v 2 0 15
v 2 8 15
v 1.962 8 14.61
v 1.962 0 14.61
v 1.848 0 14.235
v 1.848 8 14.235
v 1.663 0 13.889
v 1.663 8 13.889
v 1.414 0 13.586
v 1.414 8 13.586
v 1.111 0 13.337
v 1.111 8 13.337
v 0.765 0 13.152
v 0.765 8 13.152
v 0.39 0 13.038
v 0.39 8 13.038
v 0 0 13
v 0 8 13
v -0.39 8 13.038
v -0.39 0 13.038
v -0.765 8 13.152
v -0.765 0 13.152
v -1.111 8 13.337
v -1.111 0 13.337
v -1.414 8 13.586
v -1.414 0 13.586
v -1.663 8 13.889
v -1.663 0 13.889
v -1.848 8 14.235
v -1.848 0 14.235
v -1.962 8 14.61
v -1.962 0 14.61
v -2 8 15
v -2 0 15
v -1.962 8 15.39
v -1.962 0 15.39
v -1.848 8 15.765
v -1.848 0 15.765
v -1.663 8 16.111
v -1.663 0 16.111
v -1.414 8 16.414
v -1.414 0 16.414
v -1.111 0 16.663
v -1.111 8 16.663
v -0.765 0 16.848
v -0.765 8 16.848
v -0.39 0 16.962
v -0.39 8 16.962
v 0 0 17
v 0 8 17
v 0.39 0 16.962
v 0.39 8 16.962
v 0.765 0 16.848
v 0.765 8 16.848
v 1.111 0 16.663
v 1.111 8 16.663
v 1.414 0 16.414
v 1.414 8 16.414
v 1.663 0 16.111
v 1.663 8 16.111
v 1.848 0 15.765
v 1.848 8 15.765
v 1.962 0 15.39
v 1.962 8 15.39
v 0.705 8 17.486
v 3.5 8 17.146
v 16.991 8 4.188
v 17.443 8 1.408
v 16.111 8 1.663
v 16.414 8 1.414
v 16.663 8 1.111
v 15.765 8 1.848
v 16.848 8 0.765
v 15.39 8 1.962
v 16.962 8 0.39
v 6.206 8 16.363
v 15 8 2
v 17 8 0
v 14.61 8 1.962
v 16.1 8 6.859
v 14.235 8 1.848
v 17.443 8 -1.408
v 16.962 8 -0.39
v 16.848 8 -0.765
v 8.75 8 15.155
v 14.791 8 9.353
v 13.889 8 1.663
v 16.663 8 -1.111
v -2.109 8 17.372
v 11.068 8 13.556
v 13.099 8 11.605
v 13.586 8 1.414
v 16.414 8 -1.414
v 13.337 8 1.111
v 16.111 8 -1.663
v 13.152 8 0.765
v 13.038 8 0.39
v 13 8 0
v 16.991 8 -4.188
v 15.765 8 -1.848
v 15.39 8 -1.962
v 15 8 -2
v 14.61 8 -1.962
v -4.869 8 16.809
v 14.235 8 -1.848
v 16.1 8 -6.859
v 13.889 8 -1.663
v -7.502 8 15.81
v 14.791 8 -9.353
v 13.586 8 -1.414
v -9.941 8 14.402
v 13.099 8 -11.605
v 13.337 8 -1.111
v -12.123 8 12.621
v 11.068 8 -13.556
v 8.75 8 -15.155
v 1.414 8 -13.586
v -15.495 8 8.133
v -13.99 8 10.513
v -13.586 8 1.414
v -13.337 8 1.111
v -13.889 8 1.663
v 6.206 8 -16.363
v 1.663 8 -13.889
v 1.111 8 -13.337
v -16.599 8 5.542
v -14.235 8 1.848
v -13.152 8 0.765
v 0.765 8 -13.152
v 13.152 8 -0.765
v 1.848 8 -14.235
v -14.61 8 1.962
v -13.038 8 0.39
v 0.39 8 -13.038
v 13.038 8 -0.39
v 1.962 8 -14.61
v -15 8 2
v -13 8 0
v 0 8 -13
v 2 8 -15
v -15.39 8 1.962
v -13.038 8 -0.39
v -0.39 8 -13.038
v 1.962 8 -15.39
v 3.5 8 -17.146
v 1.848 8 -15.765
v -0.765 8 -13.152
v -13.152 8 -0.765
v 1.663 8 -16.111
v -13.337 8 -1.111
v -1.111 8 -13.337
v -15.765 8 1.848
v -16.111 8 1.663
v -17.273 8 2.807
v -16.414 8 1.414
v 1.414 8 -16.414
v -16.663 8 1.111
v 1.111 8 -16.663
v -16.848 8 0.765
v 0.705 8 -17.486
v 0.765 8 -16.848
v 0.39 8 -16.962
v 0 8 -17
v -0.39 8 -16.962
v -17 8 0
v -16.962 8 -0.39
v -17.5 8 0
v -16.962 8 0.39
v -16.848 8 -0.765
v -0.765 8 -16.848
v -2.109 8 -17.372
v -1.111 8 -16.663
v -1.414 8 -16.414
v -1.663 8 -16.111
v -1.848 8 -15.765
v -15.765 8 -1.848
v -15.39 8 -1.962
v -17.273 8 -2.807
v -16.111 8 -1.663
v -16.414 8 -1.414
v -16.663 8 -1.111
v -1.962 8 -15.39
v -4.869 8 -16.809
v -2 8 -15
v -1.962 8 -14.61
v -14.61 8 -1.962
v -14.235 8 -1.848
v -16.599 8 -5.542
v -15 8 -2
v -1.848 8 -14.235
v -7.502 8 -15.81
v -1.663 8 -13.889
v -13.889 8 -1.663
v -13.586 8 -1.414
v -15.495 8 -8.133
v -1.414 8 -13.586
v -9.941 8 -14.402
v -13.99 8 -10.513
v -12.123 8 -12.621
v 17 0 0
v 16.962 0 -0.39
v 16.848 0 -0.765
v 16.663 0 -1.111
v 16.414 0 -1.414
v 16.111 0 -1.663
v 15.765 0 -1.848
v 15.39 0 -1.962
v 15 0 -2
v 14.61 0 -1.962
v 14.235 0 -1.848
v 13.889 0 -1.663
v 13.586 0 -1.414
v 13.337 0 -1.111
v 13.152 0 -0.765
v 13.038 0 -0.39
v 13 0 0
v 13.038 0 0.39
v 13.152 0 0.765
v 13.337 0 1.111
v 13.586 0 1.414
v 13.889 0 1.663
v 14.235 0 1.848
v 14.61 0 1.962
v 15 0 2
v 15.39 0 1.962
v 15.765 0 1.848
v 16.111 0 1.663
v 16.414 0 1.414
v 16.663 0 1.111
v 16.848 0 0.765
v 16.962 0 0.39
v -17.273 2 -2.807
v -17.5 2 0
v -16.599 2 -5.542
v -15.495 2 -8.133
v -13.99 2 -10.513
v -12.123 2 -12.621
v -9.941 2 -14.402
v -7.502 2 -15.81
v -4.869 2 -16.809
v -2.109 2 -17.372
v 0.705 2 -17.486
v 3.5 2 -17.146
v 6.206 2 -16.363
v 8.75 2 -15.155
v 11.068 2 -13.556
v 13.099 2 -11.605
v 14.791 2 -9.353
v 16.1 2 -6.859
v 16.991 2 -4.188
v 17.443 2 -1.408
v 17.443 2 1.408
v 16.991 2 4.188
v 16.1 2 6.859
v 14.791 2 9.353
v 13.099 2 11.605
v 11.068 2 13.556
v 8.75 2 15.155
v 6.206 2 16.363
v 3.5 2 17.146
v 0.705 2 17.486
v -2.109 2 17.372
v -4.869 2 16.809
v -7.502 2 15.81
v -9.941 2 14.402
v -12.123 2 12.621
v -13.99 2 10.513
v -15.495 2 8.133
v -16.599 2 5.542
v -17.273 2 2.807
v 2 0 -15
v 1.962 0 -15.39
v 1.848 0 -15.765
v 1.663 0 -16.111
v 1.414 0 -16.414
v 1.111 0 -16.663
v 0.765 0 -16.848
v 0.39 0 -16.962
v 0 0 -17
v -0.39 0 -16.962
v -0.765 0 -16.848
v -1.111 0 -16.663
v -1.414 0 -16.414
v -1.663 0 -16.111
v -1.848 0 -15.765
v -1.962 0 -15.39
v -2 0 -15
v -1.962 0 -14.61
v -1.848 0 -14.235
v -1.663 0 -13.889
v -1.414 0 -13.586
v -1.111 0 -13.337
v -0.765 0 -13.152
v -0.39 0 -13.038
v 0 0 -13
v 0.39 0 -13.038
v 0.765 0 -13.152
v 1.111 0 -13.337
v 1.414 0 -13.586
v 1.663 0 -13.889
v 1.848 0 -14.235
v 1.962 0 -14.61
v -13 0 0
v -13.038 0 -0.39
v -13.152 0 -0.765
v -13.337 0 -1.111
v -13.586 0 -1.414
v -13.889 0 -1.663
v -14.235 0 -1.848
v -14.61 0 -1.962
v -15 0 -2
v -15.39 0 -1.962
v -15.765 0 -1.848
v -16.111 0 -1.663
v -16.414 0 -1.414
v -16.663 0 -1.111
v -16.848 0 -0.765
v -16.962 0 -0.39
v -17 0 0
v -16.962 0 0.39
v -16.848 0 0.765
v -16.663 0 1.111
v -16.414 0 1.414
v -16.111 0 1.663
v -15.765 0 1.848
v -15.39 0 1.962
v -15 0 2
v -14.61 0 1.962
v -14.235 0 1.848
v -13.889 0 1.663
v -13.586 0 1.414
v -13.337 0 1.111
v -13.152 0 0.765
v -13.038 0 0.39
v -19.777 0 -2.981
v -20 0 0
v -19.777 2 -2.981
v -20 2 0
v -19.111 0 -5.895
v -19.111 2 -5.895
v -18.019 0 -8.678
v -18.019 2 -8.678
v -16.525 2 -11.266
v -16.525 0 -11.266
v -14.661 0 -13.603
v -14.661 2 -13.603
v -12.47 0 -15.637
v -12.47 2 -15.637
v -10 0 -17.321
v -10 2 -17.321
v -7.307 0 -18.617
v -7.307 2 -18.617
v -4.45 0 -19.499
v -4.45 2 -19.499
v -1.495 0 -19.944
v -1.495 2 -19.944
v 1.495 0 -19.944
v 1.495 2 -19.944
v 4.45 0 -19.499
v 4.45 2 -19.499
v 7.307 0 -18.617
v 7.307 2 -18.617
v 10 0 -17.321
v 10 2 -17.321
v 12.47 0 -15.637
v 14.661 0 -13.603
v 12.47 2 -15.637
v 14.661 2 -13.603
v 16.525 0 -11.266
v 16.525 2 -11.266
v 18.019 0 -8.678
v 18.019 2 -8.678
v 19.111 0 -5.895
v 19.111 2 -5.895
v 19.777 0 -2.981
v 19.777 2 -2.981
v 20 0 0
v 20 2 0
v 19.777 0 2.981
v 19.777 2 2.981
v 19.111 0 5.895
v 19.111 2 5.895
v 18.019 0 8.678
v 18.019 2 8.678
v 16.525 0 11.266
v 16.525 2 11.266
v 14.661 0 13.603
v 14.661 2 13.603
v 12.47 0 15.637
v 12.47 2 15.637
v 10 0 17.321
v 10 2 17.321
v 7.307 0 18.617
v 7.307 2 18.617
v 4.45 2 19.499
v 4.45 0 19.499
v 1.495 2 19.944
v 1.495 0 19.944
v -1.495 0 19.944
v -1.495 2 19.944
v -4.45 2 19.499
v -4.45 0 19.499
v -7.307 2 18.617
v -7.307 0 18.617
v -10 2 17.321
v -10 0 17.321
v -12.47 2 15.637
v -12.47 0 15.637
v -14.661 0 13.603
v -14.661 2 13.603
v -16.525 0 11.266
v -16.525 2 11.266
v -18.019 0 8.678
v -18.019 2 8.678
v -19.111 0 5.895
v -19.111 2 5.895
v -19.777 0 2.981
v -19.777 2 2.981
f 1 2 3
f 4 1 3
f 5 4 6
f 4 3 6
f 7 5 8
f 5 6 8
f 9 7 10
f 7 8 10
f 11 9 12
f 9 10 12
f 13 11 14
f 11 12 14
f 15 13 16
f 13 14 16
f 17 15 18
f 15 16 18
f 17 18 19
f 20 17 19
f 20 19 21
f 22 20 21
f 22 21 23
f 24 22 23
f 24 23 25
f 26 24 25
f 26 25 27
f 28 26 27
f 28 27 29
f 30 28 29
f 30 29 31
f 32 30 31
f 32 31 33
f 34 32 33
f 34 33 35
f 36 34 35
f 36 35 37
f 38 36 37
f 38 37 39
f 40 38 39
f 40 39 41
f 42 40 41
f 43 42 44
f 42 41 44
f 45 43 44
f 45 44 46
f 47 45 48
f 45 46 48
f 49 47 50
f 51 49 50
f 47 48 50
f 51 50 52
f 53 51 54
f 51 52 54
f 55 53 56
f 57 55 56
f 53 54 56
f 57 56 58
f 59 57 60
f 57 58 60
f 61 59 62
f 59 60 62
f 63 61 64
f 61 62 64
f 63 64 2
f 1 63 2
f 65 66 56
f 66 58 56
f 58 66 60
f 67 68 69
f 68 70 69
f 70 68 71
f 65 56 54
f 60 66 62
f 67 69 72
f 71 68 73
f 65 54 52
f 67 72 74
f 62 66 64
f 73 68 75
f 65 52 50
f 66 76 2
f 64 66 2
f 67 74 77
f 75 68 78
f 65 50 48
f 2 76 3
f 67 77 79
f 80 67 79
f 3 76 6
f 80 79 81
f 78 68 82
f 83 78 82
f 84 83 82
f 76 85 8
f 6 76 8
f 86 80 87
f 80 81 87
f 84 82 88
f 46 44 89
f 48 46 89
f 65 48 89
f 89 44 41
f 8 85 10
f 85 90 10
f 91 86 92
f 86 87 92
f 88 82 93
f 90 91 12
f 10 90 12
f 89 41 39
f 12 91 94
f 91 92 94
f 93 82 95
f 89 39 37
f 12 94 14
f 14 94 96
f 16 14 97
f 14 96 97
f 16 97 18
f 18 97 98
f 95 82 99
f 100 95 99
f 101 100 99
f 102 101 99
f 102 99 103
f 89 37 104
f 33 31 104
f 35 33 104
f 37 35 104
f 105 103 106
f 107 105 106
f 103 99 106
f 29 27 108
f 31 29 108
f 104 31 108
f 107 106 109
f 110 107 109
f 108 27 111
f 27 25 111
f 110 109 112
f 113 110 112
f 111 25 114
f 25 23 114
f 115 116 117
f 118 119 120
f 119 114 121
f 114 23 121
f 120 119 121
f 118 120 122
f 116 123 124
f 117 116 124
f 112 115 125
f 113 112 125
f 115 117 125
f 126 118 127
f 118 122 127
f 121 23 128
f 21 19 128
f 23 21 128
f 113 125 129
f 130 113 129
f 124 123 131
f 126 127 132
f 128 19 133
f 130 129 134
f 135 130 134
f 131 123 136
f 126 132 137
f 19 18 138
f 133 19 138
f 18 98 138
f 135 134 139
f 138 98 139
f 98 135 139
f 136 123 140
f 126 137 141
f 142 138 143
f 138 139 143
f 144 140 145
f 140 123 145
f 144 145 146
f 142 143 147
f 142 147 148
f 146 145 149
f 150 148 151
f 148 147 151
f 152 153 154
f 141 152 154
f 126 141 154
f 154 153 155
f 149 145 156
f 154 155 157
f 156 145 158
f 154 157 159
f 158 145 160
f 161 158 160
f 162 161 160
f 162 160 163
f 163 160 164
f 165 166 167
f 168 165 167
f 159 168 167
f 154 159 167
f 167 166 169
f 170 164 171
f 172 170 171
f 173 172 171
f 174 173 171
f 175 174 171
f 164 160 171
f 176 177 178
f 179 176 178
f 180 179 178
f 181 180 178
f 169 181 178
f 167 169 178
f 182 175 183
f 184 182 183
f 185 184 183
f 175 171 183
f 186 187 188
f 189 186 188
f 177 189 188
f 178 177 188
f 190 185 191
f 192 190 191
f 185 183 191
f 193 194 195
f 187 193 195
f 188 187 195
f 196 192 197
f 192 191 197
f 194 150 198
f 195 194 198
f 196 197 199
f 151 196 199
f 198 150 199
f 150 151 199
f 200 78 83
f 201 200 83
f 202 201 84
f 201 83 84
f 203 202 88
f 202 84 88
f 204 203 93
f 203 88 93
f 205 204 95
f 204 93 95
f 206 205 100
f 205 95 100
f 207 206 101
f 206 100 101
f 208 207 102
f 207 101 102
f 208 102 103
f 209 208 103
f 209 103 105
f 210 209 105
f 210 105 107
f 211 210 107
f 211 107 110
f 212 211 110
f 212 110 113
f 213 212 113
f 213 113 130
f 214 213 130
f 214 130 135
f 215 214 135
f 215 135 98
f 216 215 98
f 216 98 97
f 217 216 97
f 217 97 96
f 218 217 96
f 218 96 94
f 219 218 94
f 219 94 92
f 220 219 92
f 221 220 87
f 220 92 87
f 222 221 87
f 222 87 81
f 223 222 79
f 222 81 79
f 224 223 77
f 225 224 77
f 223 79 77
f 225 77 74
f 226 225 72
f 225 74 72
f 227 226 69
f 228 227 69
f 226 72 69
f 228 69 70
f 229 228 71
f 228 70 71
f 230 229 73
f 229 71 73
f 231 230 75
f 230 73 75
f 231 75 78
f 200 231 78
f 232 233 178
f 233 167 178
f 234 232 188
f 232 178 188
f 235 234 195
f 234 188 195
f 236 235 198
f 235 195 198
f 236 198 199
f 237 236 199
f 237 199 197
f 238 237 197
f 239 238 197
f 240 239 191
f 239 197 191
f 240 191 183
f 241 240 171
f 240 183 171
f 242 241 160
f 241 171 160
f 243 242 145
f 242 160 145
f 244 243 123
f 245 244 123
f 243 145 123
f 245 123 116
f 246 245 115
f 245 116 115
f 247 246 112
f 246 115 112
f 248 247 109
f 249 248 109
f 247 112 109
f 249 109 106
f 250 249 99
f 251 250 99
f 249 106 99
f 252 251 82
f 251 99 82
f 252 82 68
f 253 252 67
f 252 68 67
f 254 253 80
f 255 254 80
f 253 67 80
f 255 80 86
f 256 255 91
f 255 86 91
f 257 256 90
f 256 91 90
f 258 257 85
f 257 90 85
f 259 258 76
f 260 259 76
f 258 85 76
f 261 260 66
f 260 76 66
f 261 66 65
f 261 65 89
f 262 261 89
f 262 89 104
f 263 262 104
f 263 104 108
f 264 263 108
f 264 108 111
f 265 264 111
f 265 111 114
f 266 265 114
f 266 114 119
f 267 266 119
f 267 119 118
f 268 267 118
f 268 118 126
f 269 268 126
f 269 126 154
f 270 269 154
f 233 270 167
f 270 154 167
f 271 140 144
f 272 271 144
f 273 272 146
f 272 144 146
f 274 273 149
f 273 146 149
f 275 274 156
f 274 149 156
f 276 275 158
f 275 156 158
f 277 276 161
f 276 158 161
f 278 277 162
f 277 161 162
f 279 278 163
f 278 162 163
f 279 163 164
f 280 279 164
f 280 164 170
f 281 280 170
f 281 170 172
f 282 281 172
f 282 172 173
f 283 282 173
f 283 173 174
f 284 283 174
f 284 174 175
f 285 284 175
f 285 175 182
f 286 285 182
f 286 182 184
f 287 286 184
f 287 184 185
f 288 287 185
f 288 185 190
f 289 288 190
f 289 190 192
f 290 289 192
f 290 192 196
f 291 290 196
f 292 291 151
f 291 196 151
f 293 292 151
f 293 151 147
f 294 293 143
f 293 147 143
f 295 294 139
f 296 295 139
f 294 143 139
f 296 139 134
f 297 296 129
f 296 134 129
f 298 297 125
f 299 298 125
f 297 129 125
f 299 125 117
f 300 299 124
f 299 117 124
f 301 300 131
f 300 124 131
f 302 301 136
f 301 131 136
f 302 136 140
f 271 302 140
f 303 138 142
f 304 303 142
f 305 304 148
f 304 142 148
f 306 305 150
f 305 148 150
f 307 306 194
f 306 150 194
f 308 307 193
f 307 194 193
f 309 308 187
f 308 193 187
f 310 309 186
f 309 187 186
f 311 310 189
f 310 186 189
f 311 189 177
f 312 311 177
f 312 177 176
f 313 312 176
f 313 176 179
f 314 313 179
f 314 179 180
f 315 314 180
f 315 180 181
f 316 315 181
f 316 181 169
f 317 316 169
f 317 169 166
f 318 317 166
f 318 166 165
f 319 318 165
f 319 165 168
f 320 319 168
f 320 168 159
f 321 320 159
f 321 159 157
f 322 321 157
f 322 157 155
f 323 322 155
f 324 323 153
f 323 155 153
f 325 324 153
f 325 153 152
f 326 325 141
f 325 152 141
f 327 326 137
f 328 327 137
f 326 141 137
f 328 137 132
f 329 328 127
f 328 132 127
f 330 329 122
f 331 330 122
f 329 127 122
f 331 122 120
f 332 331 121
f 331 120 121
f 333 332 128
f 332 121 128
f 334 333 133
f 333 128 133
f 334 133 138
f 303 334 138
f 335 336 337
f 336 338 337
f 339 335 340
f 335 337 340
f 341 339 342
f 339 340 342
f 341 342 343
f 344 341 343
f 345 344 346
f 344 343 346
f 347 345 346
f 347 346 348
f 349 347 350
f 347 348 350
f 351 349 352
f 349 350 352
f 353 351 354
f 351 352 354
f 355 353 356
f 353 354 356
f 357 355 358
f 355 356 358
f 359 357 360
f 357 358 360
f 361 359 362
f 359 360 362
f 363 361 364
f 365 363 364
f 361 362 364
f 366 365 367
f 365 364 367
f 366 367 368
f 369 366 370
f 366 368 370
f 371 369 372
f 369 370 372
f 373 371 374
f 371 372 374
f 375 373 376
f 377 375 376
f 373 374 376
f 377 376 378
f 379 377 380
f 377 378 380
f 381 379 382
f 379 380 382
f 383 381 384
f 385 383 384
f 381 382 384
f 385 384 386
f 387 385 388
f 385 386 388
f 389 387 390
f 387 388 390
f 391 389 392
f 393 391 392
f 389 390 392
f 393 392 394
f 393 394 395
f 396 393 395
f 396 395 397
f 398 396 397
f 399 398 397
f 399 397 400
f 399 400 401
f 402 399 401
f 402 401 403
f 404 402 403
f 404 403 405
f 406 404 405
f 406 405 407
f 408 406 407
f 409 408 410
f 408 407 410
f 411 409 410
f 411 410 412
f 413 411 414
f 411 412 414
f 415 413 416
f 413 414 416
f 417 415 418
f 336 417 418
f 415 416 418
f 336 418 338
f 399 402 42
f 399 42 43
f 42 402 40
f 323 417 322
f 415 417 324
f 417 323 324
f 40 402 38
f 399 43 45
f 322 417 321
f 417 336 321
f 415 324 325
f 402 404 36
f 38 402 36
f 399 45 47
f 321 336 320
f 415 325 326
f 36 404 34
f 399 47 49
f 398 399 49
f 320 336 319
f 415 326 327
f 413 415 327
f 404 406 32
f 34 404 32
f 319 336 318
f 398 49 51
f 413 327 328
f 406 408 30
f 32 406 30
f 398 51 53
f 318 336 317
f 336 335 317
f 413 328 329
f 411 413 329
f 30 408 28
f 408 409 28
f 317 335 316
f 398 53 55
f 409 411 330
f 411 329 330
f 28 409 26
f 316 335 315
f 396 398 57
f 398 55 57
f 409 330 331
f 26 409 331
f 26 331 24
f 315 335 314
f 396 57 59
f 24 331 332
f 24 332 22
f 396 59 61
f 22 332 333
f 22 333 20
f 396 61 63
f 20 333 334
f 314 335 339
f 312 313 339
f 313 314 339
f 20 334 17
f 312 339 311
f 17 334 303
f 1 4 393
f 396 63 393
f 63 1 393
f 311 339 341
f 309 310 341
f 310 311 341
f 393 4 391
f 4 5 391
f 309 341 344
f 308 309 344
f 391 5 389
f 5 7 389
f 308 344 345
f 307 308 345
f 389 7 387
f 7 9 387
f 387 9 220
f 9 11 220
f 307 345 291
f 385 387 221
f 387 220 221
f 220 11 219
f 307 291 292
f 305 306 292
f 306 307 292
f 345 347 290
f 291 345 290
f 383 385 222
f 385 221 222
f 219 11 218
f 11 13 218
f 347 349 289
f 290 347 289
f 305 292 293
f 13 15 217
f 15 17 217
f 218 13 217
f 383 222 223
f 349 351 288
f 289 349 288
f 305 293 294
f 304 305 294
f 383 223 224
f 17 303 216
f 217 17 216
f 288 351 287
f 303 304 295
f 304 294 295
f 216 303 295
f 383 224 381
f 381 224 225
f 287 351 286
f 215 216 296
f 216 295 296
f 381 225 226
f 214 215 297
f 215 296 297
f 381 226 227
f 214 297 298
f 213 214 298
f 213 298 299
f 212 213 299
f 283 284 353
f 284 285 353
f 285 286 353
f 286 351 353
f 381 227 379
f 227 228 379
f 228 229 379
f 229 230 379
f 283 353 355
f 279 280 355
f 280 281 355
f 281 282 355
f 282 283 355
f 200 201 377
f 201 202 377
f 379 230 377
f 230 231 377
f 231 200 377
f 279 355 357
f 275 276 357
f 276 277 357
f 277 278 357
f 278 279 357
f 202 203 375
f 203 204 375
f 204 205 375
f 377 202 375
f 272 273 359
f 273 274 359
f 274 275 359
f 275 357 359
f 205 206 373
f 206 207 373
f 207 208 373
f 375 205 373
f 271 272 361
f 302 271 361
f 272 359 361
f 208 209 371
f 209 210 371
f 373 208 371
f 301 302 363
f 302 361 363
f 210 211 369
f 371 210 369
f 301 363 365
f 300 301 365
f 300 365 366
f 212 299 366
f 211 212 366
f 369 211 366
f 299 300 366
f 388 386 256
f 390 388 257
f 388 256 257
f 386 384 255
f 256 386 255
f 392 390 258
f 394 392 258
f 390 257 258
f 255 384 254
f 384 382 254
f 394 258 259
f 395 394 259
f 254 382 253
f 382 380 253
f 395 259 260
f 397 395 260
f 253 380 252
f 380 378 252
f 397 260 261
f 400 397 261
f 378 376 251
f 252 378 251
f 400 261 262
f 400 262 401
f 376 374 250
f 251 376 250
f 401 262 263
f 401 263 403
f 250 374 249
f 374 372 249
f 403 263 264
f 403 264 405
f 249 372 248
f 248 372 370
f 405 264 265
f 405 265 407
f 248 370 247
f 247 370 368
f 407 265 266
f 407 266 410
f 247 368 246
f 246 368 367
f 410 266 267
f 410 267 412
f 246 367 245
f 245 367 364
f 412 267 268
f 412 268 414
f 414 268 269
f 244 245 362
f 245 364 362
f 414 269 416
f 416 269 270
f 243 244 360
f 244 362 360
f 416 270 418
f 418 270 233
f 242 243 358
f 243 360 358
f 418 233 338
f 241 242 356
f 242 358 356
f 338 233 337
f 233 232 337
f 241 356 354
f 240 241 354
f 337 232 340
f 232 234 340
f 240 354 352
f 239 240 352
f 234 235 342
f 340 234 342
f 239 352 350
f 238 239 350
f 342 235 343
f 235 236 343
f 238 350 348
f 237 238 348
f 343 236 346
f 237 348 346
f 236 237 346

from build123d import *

# Parameters (mm, degrees)
CUT_EXTRUDE_1_REACH             = 31.394
SKETCH_3_R                      = 2
CUT_EXTRUDE_1_DIRECTION_2_DEPTH = 30.393876913


with BuildPart() as part:
    # 草图2 → 旋转1 (revolve)
    with BuildSketch(Plane.XY):
        Polygon((0, 0), (-20, 0), (-20, 2), (-17.5, 2), (-17.5, 8), (0, 8), align=None)
    revolve(axis=Axis((0, 8, 0), (0, -1, 0)))

    # 草图3 → 切除-拉伸1 (cut, up to next)
    with BuildSketch(Plane(origin=(0, 8, 0), x_dir=(1, 0, 0), z_dir=(0, 1, 0)), mode=Mode.PRIVATE) as cut_extrude_1_sk1:
        with Locations((0, 15)):
            Circle(SKETCH_3_R)
    cut_extrude_1_tool1 = extrude(cut_extrude_1_sk1.sketch, amount=-CUT_EXTRUDE_1_REACH, mode=Mode.PRIVATE) & part.part
    # 草图3 → 切除-拉伸1 (cut, up to next)
    with BuildSketch(Plane(origin=(0, 8, 0), x_dir=(1, 0, 0), z_dir=(0, 1, 0)), mode=Mode.PRIVATE) as cut_extrude_1_sk2:
        with Locations((15, 0)):
            Circle(SKETCH_3_R)
    cut_extrude_1_tool2 = extrude(cut_extrude_1_sk2.sketch, amount=-CUT_EXTRUDE_1_REACH, mode=Mode.PRIVATE) & part.part
    # 草图3 → 切除-拉伸1 (cut, up to next)
    with BuildSketch(Plane(origin=(0, 8, 0), x_dir=(1, 0, 0), z_dir=(0, 1, 0)), mode=Mode.PRIVATE) as cut_extrude_1_sk3:
        with Locations((0, -15)):
            Circle(SKETCH_3_R)
    cut_extrude_1_tool3 = extrude(cut_extrude_1_sk3.sketch, amount=-CUT_EXTRUDE_1_REACH, mode=Mode.PRIVATE) & part.part
    # 草图3 → 切除-拉伸1 (cut, up to next)
    with BuildSketch(Plane(origin=(0, 8, 0), x_dir=(1, 0, 0), z_dir=(0, 1, 0)), mode=Mode.PRIVATE) as cut_extrude_1_sk4:
        with Locations((-15, 0)):
            Circle(SKETCH_3_R)
    cut_extrude_1_tool4 = extrude(cut_extrude_1_sk4.sketch, amount=-CUT_EXTRUDE_1_REACH, mode=Mode.PRIVATE) & part.part
    add(cut_extrude_1_tool1.solids().sort_by_distance((0, 8, -15))[0], mode=Mode.SUBTRACT)
    add(cut_extrude_1_tool2.solids().sort_by_distance((15, 8, 0))[0], mode=Mode.SUBTRACT)
    add(cut_extrude_1_tool3.solids().sort_by_distance((0, 8, 15))[0], mode=Mode.SUBTRACT)
    add(cut_extrude_1_tool4.solids().sort_by_distance((-15, 8, 0))[0], mode=Mode.SUBTRACT)

    # 草图3 → 切除-拉伸1 direction 2 (cut)
    with BuildSketch(Plane(origin=(0, 8, 0), x_dir=(1, 0, 0), z_dir=(0, 1, 0))):
        with Locations((0, 15)):
            Circle(SKETCH_3_R)
        with Locations((15, 0)):
            Circle(SKETCH_3_R)
        with Locations((0, -15)):
            Circle(SKETCH_3_R)
        with Locations((-15, 0)):
            Circle(SKETCH_3_R)
    extrude(amount=CUT_EXTRUDE_1_DIRECTION_2_DEPTH, mode=Mode.SUBTRACT)


solid = part.part
